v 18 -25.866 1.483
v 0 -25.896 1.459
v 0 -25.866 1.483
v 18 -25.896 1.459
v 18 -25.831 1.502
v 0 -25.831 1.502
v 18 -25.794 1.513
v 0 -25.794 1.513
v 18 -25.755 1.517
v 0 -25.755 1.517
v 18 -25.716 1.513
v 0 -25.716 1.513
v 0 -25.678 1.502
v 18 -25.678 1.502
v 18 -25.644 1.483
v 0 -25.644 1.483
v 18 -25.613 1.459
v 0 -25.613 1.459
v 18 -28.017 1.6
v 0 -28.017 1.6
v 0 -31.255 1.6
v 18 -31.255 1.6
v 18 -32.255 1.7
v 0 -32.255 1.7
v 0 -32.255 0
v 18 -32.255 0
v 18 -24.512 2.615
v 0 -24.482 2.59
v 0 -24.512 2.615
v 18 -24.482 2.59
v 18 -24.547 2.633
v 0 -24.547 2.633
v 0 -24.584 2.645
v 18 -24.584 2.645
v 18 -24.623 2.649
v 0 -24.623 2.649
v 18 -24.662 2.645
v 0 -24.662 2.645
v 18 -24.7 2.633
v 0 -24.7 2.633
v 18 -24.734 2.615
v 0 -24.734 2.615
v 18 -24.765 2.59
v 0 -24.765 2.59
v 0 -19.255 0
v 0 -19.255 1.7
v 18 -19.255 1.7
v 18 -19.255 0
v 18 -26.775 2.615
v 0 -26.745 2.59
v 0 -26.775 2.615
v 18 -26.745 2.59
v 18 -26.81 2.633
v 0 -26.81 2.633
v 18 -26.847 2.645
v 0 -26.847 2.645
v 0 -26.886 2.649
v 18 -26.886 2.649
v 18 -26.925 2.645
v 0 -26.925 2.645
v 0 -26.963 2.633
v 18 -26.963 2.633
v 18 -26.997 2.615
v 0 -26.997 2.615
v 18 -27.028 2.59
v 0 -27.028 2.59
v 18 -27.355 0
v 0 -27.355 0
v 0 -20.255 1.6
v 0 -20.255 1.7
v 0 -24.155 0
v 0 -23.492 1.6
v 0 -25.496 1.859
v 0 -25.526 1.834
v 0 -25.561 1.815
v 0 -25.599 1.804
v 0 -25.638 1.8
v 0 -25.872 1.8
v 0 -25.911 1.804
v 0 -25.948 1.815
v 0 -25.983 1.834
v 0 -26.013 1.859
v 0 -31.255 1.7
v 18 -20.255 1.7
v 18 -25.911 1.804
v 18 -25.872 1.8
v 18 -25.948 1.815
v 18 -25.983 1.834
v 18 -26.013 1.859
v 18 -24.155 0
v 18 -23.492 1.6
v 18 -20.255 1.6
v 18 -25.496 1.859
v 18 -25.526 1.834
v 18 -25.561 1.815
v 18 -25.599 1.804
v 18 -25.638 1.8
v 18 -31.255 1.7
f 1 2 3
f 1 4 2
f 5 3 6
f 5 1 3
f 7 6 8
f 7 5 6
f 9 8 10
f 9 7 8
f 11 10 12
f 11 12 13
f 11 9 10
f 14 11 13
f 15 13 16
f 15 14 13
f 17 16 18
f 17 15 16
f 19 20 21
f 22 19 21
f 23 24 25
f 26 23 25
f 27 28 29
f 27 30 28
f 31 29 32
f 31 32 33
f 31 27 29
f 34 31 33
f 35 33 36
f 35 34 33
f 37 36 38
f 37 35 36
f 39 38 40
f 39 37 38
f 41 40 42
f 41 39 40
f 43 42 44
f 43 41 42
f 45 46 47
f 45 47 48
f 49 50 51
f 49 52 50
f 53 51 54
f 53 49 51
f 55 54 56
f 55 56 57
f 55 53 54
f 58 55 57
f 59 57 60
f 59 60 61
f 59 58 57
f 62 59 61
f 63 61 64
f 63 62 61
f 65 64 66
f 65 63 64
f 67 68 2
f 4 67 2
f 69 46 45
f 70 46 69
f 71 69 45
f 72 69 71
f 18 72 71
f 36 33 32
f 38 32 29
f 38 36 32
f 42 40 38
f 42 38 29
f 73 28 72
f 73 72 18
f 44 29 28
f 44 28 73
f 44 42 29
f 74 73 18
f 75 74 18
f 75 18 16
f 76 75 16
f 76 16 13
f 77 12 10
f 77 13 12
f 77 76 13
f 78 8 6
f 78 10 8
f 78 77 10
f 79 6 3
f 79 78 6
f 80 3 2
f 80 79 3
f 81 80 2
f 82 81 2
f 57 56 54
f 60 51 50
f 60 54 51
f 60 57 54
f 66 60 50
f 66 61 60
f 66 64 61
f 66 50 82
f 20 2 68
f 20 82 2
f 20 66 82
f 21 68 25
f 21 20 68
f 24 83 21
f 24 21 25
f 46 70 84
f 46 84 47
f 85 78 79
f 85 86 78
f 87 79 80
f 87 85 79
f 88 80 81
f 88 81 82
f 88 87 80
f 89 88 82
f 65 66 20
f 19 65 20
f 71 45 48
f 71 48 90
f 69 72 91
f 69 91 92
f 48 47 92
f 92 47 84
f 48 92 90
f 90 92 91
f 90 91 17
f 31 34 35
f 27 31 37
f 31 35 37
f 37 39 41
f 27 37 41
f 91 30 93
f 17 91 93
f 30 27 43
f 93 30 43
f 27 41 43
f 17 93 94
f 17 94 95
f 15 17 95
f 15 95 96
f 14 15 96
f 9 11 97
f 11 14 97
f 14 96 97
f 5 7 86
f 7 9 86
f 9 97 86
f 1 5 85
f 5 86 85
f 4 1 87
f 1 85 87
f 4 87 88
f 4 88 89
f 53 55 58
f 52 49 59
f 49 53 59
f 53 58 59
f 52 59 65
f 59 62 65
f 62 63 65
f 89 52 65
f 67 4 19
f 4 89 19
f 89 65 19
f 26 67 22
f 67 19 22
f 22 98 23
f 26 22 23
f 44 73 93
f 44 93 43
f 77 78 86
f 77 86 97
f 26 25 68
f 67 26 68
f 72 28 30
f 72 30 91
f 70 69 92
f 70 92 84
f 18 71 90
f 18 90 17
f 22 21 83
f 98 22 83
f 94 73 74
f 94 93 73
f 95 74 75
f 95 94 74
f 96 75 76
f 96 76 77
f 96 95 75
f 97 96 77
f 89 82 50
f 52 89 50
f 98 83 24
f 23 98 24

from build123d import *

# Parameters (mm, degrees)
F1_DEPTH = 18
F5_R     = 0.2


with BuildPart() as f1:
    # F0 (on Right) → F1 (new body)
    with BuildSketch(Plane.YZ):
        Polygon((-32.2547115611, 1.6), (-32.2547115611, 0), (-27.3547115611, 0), (-25.7547115611, 1.6), (-25.7547115611, 1.8), (-25.9547115611, 1.8), (-26.886082411, 2.7313708499), (-28.0174532609, 1.6), (-31.2547115611, 1.6), (-31.2547115611, 1.7), (-32.2547115611, 1.7), align=None)
    extrude(amount=F1_DEPTH)

    # F4: F1 across plane


with BuildPart() as f1_1:
    add(f1.part)
    add(f1.part.mirror(Plane.XZ.offset(25.7547115611)))

    # F5
    f5_edges = [f1_1.edges().sort_by_distance(p)[0] for p in [
        (9, -25.554712, 1.8),
        (9, -25.954712, 1.8),
        (9, -25.754712, 1.6),
        (9, -24.623341, 2.731371),
        (9, -26.886082, 2.731371),
    ]]
    fillet(f5_edges, radius=F5_R)


solid = f1_1.part
